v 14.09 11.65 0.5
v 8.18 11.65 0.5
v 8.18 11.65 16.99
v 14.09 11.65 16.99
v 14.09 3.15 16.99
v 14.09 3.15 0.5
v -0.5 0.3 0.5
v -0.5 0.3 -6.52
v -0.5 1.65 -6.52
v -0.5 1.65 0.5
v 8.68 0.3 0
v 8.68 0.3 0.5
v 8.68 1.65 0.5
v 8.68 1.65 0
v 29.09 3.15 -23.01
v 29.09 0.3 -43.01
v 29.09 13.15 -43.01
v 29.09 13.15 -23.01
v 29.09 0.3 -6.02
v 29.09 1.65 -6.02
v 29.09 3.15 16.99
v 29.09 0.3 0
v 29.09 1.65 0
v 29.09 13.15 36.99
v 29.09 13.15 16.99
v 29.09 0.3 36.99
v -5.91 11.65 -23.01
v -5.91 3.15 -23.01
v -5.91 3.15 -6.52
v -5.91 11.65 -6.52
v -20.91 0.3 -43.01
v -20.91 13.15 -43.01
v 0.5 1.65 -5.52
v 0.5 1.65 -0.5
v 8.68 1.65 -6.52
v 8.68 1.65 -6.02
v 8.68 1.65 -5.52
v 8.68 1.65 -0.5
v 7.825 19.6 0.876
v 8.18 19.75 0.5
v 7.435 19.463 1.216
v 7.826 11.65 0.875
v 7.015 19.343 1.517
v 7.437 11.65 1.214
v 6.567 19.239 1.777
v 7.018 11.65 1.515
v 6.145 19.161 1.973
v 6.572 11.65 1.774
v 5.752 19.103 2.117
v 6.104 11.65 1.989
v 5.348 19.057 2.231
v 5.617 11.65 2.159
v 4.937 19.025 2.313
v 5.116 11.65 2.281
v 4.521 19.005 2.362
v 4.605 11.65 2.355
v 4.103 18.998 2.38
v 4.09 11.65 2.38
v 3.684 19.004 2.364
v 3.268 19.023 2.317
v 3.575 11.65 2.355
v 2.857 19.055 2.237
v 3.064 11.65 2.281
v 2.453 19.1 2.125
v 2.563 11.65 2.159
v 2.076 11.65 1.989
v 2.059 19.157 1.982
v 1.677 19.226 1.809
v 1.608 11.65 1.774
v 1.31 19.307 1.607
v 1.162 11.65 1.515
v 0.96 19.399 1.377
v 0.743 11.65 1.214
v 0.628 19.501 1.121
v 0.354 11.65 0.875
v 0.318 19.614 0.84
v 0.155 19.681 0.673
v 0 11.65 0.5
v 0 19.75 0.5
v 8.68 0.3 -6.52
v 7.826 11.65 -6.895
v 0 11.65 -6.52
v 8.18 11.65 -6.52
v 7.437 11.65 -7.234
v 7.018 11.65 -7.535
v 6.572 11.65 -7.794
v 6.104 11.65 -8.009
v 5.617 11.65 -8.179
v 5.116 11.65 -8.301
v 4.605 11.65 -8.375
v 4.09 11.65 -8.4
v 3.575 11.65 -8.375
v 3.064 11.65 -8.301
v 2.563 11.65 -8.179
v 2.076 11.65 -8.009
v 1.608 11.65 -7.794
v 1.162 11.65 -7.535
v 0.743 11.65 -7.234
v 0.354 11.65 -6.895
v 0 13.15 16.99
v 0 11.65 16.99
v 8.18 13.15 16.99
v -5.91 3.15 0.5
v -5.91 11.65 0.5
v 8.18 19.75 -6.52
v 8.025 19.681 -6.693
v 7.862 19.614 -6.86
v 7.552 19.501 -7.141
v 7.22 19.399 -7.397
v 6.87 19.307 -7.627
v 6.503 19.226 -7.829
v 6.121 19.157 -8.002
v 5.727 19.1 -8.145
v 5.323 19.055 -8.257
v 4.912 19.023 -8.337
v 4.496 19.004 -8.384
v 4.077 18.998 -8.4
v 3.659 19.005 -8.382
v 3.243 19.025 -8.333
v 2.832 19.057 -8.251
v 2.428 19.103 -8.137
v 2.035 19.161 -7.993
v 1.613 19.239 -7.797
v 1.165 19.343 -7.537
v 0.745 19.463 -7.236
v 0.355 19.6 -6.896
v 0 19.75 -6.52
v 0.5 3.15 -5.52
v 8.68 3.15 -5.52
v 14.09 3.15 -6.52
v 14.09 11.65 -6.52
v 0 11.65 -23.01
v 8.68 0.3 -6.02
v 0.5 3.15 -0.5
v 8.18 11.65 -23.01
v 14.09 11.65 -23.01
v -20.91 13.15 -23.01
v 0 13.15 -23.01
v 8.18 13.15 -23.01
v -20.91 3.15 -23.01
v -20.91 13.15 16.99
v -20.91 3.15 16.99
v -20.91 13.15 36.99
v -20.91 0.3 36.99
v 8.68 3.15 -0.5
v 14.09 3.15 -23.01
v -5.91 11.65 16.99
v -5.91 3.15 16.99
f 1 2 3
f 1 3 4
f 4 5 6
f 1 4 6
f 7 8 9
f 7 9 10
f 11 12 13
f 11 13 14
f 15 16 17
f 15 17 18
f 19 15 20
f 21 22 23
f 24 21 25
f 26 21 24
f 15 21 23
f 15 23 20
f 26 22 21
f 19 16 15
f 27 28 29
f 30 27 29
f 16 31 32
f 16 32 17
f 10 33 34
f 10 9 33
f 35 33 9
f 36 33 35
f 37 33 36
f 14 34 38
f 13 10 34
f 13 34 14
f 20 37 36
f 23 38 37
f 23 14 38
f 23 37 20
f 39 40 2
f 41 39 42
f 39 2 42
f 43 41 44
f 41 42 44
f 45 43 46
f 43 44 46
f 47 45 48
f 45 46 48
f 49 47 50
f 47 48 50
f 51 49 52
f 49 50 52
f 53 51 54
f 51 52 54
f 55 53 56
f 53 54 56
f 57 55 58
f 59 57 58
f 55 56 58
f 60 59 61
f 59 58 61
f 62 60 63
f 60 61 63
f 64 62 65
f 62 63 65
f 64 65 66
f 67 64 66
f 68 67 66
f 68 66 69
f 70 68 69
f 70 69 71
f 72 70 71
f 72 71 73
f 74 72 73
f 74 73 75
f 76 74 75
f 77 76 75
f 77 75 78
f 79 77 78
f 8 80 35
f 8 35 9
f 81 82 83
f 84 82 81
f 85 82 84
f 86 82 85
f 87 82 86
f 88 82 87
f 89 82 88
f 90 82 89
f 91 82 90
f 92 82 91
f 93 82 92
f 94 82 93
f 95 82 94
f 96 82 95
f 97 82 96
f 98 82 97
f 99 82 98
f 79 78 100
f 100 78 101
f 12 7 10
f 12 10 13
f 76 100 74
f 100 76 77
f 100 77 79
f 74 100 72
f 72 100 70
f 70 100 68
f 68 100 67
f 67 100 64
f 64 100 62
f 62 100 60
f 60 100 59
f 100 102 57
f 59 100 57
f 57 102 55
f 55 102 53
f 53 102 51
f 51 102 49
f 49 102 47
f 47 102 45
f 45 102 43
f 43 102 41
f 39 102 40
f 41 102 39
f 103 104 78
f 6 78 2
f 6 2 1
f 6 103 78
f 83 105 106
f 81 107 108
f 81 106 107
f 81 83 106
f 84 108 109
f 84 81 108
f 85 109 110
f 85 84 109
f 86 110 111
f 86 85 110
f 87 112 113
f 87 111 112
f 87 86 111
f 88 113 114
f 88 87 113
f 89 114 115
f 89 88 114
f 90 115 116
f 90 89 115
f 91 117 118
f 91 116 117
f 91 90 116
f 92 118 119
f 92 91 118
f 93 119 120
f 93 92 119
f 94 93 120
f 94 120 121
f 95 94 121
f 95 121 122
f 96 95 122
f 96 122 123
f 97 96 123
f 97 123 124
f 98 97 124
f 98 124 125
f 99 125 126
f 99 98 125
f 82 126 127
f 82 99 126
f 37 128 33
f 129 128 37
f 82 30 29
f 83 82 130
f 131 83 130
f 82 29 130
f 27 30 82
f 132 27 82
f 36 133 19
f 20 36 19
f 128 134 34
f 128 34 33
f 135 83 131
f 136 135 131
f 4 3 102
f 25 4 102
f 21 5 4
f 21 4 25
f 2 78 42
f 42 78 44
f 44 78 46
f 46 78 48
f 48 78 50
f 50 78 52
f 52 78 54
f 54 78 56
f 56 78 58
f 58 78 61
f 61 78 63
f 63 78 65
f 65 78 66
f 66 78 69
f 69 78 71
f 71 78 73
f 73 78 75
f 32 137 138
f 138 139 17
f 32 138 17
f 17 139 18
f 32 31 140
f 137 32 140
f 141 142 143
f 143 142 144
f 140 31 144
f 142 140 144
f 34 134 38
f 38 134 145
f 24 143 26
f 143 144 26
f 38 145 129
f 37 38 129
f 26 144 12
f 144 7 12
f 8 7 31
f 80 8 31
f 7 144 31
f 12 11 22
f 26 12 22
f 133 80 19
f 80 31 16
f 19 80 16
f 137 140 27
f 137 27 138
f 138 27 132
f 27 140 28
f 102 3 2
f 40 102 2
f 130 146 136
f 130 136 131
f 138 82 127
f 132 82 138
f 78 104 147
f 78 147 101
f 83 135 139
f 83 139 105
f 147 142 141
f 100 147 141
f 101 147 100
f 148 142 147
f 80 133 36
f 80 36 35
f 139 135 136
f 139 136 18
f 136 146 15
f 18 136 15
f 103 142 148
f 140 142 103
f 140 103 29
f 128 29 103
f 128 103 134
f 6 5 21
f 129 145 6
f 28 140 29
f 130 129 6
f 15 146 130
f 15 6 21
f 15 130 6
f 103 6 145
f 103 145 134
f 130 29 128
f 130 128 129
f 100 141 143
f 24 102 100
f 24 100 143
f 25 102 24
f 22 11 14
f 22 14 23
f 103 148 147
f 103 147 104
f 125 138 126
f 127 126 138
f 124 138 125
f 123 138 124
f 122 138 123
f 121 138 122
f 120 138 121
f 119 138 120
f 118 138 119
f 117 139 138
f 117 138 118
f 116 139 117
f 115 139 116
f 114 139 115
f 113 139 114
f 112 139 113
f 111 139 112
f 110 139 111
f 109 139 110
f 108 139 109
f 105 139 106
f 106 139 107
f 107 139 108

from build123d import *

# Parameters (mm, degrees)
BOSS_EXTRUDE1_DEPTH  = 3.15
SKETCH3_W            = 12.18
SKETCH3_H            = 10.02
SKETCH3_W_2          = 8.18
SKETCH3_H_2          = 5.02
BOSS_EXTRUDE2_DEPTH  = 1.5
SKETCH5_W            = 12.18
SKETCH5_H            = 10.02
CUT_EXTRUDE1_DEPTH   = 0.3
SKETCH7_W            = 50
SKETCH7_H            = 80
SKETCH7_W_2          = 12.18
SKETCH7_H_2          = 10.02
BOSS_EXTRUDE7_DEPTH  = 2.85
SKETCH8_W            = 50
SKETCH8_H            = 20
BOSS_EXTRUDE8_DEPTH  = 10
SKETCH9_W            = 18.91
SKETCH9_H            = 6.02
CUT_EXTRUDE2_DEPTH   = 1.35
SKETCH11_W           = 20
SKETCH11_H           = 16.49
BOSS_EXTRUDE9_DEPTH  = 8.5
BOSS_EXTRUDE10_DEPTH = 8.1
CUT_EXTRUDE3_DEPTH   = 10


with BuildPart() as part:
    # Sketch1 → Boss-Extrude1 (new body)
    with BuildSketch(Plane(origin=(0, 0, 0), x_dir=(1, 0, 0), z_dir=(0, 1, 0))):
        Polygon((-0.5, -0.5), (8.68, -0.5), (8.68, 0), (10.18, 0), (10.18, -2), (-2, -2), (-2, 8.02), (10.18, 8.02), (10.18, 6.02), (8.68, 6.02), (8.68, 6.52), (-0.5, 6.52), align=None)
    extrude(amount=BOSS_EXTRUDE1_DEPTH)

    # Sketch3 → Boss-Extrude2 (add)
    with BuildSketch(Plane(origin=(0, 3.15, 0), x_dir=(1, 0, 0), z_dir=(0, 1, 0))):
        with Locations((4.09, 3.01)):
            Rectangle(SKETCH3_W, SKETCH3_H)
        with Locations((4.59, 3.01)):
            Rectangle(SKETCH3_W_2, SKETCH3_H_2, mode=Mode.SUBTRACT)
    extrude(amount=-BOSS_EXTRUDE2_DEPTH)

    # Sketch5 → Cut-Extrude1 (cut)
    with BuildSketch(Plane.XZ):
        with Locations((4.09, -3.01)):
            Rectangle(SKETCH5_W, SKETCH5_H)
    extrude(amount=-CUT_EXTRUDE1_DEPTH, mode=Mode.SUBTRACT)

    # Sketch7 → Boss-Extrude7 (add)
    with BuildSketch(Plane(origin=(0, 3.15, 0), x_dir=(1, 0, 0), z_dir=(0, 1, 0))):
        with Locations((4.09, 3.01)):
            Rectangle(SKETCH7_W, SKETCH7_H)
        with Locations((4.09, 3.01)):
            Rectangle(SKETCH7_W_2, SKETCH7_H_2, mode=Mode.SUBTRACT)
    extrude(amount=-BOSS_EXTRUDE7_DEPTH)

    # Sketch8 → Boss-Extrude8 (add)
    with BuildSketch(Plane(origin=(0, 3.15, 0), x_dir=(1, 0, 0), z_dir=(0, 1, 0))):
        with Locations((4.09, -26.99)):
            Rectangle(SKETCH8_W, SKETCH8_H)
    boss_extrude8 = extrude(amount=BOSS_EXTRUDE8_DEPTH)

    # Sketch9 → Cut-Extrude2 (cut)
    with BuildSketch(Plane.XZ.offset(-0.3)):
        with Locations((19.635, -3.01)):
            Rectangle(SKETCH9_W, SKETCH9_H)
    extrude(amount=-CUT_EXTRUDE2_DEPTH, mode=Mode.SUBTRACT)

    # Sketch11 → Boss-Extrude9 (add)
    with BuildSketch(Plane(origin=(0, 3.15, 0), x_dir=(1, 0, 0), z_dir=(0, 1, 0))):
        with Locations((4.09, -8.745)):
            Rectangle(SKETCH11_W, SKETCH11_H)
    boss_extrude9 = extrude(amount=BOSS_EXTRUDE9_DEPTH)

    # Sketch12 → Boss-Extrude10 (add)
    with BuildSketch(Plane(origin=(0, 11.65, 0), x_dir=(1, 0, 0), z_dir=(0, 1, 0))):
        with BuildLine():
            Line((0, -0.5), (0, -16.99))
            Line((0, -16.99), (8.18, -16.99))
            Line((8.18, -16.99), (8.18, -0.5))
            ThreePointArc((8.18, -0.5), (4.09, -2.379638207), (0, -0.5))
        make_face()
    boss_extrude10 = extrude(amount=BOSS_EXTRUDE10_DEPTH)

    # Sketch13 → Cut-Extrude3 (cut)
    with BuildSketch(Plane(origin=(8.18, 0, 0), x_dir=(0, 0, -1), z_dir=(1, 0, 0))):
        Polygon((-16.99, 13.15), (-0.5, 19.75), (-16.99, 19.75), align=None)
    cut_extrude3 = extrude(amount=-CUT_EXTRUDE3_DEPTH, mode=Mode.SUBTRACT)

    # Mirror2: Boss-Extrude8, Boss-Extrude9, Boss-Extrude10, Cut-Extrude3 across plane
    add(boss_extrude8.mirror(Plane.XY.offset(-3.01)))
    add(boss_extrude9.mirror(Plane.XY.offset(-3.01)))
    add(boss_extrude10.mirror(Plane.XY.offset(-3.01)))
    add(cut_extrude3.mirror(Plane.XY.offset(-3.01)), mode=Mode.SUBTRACT)


solid = part.part
